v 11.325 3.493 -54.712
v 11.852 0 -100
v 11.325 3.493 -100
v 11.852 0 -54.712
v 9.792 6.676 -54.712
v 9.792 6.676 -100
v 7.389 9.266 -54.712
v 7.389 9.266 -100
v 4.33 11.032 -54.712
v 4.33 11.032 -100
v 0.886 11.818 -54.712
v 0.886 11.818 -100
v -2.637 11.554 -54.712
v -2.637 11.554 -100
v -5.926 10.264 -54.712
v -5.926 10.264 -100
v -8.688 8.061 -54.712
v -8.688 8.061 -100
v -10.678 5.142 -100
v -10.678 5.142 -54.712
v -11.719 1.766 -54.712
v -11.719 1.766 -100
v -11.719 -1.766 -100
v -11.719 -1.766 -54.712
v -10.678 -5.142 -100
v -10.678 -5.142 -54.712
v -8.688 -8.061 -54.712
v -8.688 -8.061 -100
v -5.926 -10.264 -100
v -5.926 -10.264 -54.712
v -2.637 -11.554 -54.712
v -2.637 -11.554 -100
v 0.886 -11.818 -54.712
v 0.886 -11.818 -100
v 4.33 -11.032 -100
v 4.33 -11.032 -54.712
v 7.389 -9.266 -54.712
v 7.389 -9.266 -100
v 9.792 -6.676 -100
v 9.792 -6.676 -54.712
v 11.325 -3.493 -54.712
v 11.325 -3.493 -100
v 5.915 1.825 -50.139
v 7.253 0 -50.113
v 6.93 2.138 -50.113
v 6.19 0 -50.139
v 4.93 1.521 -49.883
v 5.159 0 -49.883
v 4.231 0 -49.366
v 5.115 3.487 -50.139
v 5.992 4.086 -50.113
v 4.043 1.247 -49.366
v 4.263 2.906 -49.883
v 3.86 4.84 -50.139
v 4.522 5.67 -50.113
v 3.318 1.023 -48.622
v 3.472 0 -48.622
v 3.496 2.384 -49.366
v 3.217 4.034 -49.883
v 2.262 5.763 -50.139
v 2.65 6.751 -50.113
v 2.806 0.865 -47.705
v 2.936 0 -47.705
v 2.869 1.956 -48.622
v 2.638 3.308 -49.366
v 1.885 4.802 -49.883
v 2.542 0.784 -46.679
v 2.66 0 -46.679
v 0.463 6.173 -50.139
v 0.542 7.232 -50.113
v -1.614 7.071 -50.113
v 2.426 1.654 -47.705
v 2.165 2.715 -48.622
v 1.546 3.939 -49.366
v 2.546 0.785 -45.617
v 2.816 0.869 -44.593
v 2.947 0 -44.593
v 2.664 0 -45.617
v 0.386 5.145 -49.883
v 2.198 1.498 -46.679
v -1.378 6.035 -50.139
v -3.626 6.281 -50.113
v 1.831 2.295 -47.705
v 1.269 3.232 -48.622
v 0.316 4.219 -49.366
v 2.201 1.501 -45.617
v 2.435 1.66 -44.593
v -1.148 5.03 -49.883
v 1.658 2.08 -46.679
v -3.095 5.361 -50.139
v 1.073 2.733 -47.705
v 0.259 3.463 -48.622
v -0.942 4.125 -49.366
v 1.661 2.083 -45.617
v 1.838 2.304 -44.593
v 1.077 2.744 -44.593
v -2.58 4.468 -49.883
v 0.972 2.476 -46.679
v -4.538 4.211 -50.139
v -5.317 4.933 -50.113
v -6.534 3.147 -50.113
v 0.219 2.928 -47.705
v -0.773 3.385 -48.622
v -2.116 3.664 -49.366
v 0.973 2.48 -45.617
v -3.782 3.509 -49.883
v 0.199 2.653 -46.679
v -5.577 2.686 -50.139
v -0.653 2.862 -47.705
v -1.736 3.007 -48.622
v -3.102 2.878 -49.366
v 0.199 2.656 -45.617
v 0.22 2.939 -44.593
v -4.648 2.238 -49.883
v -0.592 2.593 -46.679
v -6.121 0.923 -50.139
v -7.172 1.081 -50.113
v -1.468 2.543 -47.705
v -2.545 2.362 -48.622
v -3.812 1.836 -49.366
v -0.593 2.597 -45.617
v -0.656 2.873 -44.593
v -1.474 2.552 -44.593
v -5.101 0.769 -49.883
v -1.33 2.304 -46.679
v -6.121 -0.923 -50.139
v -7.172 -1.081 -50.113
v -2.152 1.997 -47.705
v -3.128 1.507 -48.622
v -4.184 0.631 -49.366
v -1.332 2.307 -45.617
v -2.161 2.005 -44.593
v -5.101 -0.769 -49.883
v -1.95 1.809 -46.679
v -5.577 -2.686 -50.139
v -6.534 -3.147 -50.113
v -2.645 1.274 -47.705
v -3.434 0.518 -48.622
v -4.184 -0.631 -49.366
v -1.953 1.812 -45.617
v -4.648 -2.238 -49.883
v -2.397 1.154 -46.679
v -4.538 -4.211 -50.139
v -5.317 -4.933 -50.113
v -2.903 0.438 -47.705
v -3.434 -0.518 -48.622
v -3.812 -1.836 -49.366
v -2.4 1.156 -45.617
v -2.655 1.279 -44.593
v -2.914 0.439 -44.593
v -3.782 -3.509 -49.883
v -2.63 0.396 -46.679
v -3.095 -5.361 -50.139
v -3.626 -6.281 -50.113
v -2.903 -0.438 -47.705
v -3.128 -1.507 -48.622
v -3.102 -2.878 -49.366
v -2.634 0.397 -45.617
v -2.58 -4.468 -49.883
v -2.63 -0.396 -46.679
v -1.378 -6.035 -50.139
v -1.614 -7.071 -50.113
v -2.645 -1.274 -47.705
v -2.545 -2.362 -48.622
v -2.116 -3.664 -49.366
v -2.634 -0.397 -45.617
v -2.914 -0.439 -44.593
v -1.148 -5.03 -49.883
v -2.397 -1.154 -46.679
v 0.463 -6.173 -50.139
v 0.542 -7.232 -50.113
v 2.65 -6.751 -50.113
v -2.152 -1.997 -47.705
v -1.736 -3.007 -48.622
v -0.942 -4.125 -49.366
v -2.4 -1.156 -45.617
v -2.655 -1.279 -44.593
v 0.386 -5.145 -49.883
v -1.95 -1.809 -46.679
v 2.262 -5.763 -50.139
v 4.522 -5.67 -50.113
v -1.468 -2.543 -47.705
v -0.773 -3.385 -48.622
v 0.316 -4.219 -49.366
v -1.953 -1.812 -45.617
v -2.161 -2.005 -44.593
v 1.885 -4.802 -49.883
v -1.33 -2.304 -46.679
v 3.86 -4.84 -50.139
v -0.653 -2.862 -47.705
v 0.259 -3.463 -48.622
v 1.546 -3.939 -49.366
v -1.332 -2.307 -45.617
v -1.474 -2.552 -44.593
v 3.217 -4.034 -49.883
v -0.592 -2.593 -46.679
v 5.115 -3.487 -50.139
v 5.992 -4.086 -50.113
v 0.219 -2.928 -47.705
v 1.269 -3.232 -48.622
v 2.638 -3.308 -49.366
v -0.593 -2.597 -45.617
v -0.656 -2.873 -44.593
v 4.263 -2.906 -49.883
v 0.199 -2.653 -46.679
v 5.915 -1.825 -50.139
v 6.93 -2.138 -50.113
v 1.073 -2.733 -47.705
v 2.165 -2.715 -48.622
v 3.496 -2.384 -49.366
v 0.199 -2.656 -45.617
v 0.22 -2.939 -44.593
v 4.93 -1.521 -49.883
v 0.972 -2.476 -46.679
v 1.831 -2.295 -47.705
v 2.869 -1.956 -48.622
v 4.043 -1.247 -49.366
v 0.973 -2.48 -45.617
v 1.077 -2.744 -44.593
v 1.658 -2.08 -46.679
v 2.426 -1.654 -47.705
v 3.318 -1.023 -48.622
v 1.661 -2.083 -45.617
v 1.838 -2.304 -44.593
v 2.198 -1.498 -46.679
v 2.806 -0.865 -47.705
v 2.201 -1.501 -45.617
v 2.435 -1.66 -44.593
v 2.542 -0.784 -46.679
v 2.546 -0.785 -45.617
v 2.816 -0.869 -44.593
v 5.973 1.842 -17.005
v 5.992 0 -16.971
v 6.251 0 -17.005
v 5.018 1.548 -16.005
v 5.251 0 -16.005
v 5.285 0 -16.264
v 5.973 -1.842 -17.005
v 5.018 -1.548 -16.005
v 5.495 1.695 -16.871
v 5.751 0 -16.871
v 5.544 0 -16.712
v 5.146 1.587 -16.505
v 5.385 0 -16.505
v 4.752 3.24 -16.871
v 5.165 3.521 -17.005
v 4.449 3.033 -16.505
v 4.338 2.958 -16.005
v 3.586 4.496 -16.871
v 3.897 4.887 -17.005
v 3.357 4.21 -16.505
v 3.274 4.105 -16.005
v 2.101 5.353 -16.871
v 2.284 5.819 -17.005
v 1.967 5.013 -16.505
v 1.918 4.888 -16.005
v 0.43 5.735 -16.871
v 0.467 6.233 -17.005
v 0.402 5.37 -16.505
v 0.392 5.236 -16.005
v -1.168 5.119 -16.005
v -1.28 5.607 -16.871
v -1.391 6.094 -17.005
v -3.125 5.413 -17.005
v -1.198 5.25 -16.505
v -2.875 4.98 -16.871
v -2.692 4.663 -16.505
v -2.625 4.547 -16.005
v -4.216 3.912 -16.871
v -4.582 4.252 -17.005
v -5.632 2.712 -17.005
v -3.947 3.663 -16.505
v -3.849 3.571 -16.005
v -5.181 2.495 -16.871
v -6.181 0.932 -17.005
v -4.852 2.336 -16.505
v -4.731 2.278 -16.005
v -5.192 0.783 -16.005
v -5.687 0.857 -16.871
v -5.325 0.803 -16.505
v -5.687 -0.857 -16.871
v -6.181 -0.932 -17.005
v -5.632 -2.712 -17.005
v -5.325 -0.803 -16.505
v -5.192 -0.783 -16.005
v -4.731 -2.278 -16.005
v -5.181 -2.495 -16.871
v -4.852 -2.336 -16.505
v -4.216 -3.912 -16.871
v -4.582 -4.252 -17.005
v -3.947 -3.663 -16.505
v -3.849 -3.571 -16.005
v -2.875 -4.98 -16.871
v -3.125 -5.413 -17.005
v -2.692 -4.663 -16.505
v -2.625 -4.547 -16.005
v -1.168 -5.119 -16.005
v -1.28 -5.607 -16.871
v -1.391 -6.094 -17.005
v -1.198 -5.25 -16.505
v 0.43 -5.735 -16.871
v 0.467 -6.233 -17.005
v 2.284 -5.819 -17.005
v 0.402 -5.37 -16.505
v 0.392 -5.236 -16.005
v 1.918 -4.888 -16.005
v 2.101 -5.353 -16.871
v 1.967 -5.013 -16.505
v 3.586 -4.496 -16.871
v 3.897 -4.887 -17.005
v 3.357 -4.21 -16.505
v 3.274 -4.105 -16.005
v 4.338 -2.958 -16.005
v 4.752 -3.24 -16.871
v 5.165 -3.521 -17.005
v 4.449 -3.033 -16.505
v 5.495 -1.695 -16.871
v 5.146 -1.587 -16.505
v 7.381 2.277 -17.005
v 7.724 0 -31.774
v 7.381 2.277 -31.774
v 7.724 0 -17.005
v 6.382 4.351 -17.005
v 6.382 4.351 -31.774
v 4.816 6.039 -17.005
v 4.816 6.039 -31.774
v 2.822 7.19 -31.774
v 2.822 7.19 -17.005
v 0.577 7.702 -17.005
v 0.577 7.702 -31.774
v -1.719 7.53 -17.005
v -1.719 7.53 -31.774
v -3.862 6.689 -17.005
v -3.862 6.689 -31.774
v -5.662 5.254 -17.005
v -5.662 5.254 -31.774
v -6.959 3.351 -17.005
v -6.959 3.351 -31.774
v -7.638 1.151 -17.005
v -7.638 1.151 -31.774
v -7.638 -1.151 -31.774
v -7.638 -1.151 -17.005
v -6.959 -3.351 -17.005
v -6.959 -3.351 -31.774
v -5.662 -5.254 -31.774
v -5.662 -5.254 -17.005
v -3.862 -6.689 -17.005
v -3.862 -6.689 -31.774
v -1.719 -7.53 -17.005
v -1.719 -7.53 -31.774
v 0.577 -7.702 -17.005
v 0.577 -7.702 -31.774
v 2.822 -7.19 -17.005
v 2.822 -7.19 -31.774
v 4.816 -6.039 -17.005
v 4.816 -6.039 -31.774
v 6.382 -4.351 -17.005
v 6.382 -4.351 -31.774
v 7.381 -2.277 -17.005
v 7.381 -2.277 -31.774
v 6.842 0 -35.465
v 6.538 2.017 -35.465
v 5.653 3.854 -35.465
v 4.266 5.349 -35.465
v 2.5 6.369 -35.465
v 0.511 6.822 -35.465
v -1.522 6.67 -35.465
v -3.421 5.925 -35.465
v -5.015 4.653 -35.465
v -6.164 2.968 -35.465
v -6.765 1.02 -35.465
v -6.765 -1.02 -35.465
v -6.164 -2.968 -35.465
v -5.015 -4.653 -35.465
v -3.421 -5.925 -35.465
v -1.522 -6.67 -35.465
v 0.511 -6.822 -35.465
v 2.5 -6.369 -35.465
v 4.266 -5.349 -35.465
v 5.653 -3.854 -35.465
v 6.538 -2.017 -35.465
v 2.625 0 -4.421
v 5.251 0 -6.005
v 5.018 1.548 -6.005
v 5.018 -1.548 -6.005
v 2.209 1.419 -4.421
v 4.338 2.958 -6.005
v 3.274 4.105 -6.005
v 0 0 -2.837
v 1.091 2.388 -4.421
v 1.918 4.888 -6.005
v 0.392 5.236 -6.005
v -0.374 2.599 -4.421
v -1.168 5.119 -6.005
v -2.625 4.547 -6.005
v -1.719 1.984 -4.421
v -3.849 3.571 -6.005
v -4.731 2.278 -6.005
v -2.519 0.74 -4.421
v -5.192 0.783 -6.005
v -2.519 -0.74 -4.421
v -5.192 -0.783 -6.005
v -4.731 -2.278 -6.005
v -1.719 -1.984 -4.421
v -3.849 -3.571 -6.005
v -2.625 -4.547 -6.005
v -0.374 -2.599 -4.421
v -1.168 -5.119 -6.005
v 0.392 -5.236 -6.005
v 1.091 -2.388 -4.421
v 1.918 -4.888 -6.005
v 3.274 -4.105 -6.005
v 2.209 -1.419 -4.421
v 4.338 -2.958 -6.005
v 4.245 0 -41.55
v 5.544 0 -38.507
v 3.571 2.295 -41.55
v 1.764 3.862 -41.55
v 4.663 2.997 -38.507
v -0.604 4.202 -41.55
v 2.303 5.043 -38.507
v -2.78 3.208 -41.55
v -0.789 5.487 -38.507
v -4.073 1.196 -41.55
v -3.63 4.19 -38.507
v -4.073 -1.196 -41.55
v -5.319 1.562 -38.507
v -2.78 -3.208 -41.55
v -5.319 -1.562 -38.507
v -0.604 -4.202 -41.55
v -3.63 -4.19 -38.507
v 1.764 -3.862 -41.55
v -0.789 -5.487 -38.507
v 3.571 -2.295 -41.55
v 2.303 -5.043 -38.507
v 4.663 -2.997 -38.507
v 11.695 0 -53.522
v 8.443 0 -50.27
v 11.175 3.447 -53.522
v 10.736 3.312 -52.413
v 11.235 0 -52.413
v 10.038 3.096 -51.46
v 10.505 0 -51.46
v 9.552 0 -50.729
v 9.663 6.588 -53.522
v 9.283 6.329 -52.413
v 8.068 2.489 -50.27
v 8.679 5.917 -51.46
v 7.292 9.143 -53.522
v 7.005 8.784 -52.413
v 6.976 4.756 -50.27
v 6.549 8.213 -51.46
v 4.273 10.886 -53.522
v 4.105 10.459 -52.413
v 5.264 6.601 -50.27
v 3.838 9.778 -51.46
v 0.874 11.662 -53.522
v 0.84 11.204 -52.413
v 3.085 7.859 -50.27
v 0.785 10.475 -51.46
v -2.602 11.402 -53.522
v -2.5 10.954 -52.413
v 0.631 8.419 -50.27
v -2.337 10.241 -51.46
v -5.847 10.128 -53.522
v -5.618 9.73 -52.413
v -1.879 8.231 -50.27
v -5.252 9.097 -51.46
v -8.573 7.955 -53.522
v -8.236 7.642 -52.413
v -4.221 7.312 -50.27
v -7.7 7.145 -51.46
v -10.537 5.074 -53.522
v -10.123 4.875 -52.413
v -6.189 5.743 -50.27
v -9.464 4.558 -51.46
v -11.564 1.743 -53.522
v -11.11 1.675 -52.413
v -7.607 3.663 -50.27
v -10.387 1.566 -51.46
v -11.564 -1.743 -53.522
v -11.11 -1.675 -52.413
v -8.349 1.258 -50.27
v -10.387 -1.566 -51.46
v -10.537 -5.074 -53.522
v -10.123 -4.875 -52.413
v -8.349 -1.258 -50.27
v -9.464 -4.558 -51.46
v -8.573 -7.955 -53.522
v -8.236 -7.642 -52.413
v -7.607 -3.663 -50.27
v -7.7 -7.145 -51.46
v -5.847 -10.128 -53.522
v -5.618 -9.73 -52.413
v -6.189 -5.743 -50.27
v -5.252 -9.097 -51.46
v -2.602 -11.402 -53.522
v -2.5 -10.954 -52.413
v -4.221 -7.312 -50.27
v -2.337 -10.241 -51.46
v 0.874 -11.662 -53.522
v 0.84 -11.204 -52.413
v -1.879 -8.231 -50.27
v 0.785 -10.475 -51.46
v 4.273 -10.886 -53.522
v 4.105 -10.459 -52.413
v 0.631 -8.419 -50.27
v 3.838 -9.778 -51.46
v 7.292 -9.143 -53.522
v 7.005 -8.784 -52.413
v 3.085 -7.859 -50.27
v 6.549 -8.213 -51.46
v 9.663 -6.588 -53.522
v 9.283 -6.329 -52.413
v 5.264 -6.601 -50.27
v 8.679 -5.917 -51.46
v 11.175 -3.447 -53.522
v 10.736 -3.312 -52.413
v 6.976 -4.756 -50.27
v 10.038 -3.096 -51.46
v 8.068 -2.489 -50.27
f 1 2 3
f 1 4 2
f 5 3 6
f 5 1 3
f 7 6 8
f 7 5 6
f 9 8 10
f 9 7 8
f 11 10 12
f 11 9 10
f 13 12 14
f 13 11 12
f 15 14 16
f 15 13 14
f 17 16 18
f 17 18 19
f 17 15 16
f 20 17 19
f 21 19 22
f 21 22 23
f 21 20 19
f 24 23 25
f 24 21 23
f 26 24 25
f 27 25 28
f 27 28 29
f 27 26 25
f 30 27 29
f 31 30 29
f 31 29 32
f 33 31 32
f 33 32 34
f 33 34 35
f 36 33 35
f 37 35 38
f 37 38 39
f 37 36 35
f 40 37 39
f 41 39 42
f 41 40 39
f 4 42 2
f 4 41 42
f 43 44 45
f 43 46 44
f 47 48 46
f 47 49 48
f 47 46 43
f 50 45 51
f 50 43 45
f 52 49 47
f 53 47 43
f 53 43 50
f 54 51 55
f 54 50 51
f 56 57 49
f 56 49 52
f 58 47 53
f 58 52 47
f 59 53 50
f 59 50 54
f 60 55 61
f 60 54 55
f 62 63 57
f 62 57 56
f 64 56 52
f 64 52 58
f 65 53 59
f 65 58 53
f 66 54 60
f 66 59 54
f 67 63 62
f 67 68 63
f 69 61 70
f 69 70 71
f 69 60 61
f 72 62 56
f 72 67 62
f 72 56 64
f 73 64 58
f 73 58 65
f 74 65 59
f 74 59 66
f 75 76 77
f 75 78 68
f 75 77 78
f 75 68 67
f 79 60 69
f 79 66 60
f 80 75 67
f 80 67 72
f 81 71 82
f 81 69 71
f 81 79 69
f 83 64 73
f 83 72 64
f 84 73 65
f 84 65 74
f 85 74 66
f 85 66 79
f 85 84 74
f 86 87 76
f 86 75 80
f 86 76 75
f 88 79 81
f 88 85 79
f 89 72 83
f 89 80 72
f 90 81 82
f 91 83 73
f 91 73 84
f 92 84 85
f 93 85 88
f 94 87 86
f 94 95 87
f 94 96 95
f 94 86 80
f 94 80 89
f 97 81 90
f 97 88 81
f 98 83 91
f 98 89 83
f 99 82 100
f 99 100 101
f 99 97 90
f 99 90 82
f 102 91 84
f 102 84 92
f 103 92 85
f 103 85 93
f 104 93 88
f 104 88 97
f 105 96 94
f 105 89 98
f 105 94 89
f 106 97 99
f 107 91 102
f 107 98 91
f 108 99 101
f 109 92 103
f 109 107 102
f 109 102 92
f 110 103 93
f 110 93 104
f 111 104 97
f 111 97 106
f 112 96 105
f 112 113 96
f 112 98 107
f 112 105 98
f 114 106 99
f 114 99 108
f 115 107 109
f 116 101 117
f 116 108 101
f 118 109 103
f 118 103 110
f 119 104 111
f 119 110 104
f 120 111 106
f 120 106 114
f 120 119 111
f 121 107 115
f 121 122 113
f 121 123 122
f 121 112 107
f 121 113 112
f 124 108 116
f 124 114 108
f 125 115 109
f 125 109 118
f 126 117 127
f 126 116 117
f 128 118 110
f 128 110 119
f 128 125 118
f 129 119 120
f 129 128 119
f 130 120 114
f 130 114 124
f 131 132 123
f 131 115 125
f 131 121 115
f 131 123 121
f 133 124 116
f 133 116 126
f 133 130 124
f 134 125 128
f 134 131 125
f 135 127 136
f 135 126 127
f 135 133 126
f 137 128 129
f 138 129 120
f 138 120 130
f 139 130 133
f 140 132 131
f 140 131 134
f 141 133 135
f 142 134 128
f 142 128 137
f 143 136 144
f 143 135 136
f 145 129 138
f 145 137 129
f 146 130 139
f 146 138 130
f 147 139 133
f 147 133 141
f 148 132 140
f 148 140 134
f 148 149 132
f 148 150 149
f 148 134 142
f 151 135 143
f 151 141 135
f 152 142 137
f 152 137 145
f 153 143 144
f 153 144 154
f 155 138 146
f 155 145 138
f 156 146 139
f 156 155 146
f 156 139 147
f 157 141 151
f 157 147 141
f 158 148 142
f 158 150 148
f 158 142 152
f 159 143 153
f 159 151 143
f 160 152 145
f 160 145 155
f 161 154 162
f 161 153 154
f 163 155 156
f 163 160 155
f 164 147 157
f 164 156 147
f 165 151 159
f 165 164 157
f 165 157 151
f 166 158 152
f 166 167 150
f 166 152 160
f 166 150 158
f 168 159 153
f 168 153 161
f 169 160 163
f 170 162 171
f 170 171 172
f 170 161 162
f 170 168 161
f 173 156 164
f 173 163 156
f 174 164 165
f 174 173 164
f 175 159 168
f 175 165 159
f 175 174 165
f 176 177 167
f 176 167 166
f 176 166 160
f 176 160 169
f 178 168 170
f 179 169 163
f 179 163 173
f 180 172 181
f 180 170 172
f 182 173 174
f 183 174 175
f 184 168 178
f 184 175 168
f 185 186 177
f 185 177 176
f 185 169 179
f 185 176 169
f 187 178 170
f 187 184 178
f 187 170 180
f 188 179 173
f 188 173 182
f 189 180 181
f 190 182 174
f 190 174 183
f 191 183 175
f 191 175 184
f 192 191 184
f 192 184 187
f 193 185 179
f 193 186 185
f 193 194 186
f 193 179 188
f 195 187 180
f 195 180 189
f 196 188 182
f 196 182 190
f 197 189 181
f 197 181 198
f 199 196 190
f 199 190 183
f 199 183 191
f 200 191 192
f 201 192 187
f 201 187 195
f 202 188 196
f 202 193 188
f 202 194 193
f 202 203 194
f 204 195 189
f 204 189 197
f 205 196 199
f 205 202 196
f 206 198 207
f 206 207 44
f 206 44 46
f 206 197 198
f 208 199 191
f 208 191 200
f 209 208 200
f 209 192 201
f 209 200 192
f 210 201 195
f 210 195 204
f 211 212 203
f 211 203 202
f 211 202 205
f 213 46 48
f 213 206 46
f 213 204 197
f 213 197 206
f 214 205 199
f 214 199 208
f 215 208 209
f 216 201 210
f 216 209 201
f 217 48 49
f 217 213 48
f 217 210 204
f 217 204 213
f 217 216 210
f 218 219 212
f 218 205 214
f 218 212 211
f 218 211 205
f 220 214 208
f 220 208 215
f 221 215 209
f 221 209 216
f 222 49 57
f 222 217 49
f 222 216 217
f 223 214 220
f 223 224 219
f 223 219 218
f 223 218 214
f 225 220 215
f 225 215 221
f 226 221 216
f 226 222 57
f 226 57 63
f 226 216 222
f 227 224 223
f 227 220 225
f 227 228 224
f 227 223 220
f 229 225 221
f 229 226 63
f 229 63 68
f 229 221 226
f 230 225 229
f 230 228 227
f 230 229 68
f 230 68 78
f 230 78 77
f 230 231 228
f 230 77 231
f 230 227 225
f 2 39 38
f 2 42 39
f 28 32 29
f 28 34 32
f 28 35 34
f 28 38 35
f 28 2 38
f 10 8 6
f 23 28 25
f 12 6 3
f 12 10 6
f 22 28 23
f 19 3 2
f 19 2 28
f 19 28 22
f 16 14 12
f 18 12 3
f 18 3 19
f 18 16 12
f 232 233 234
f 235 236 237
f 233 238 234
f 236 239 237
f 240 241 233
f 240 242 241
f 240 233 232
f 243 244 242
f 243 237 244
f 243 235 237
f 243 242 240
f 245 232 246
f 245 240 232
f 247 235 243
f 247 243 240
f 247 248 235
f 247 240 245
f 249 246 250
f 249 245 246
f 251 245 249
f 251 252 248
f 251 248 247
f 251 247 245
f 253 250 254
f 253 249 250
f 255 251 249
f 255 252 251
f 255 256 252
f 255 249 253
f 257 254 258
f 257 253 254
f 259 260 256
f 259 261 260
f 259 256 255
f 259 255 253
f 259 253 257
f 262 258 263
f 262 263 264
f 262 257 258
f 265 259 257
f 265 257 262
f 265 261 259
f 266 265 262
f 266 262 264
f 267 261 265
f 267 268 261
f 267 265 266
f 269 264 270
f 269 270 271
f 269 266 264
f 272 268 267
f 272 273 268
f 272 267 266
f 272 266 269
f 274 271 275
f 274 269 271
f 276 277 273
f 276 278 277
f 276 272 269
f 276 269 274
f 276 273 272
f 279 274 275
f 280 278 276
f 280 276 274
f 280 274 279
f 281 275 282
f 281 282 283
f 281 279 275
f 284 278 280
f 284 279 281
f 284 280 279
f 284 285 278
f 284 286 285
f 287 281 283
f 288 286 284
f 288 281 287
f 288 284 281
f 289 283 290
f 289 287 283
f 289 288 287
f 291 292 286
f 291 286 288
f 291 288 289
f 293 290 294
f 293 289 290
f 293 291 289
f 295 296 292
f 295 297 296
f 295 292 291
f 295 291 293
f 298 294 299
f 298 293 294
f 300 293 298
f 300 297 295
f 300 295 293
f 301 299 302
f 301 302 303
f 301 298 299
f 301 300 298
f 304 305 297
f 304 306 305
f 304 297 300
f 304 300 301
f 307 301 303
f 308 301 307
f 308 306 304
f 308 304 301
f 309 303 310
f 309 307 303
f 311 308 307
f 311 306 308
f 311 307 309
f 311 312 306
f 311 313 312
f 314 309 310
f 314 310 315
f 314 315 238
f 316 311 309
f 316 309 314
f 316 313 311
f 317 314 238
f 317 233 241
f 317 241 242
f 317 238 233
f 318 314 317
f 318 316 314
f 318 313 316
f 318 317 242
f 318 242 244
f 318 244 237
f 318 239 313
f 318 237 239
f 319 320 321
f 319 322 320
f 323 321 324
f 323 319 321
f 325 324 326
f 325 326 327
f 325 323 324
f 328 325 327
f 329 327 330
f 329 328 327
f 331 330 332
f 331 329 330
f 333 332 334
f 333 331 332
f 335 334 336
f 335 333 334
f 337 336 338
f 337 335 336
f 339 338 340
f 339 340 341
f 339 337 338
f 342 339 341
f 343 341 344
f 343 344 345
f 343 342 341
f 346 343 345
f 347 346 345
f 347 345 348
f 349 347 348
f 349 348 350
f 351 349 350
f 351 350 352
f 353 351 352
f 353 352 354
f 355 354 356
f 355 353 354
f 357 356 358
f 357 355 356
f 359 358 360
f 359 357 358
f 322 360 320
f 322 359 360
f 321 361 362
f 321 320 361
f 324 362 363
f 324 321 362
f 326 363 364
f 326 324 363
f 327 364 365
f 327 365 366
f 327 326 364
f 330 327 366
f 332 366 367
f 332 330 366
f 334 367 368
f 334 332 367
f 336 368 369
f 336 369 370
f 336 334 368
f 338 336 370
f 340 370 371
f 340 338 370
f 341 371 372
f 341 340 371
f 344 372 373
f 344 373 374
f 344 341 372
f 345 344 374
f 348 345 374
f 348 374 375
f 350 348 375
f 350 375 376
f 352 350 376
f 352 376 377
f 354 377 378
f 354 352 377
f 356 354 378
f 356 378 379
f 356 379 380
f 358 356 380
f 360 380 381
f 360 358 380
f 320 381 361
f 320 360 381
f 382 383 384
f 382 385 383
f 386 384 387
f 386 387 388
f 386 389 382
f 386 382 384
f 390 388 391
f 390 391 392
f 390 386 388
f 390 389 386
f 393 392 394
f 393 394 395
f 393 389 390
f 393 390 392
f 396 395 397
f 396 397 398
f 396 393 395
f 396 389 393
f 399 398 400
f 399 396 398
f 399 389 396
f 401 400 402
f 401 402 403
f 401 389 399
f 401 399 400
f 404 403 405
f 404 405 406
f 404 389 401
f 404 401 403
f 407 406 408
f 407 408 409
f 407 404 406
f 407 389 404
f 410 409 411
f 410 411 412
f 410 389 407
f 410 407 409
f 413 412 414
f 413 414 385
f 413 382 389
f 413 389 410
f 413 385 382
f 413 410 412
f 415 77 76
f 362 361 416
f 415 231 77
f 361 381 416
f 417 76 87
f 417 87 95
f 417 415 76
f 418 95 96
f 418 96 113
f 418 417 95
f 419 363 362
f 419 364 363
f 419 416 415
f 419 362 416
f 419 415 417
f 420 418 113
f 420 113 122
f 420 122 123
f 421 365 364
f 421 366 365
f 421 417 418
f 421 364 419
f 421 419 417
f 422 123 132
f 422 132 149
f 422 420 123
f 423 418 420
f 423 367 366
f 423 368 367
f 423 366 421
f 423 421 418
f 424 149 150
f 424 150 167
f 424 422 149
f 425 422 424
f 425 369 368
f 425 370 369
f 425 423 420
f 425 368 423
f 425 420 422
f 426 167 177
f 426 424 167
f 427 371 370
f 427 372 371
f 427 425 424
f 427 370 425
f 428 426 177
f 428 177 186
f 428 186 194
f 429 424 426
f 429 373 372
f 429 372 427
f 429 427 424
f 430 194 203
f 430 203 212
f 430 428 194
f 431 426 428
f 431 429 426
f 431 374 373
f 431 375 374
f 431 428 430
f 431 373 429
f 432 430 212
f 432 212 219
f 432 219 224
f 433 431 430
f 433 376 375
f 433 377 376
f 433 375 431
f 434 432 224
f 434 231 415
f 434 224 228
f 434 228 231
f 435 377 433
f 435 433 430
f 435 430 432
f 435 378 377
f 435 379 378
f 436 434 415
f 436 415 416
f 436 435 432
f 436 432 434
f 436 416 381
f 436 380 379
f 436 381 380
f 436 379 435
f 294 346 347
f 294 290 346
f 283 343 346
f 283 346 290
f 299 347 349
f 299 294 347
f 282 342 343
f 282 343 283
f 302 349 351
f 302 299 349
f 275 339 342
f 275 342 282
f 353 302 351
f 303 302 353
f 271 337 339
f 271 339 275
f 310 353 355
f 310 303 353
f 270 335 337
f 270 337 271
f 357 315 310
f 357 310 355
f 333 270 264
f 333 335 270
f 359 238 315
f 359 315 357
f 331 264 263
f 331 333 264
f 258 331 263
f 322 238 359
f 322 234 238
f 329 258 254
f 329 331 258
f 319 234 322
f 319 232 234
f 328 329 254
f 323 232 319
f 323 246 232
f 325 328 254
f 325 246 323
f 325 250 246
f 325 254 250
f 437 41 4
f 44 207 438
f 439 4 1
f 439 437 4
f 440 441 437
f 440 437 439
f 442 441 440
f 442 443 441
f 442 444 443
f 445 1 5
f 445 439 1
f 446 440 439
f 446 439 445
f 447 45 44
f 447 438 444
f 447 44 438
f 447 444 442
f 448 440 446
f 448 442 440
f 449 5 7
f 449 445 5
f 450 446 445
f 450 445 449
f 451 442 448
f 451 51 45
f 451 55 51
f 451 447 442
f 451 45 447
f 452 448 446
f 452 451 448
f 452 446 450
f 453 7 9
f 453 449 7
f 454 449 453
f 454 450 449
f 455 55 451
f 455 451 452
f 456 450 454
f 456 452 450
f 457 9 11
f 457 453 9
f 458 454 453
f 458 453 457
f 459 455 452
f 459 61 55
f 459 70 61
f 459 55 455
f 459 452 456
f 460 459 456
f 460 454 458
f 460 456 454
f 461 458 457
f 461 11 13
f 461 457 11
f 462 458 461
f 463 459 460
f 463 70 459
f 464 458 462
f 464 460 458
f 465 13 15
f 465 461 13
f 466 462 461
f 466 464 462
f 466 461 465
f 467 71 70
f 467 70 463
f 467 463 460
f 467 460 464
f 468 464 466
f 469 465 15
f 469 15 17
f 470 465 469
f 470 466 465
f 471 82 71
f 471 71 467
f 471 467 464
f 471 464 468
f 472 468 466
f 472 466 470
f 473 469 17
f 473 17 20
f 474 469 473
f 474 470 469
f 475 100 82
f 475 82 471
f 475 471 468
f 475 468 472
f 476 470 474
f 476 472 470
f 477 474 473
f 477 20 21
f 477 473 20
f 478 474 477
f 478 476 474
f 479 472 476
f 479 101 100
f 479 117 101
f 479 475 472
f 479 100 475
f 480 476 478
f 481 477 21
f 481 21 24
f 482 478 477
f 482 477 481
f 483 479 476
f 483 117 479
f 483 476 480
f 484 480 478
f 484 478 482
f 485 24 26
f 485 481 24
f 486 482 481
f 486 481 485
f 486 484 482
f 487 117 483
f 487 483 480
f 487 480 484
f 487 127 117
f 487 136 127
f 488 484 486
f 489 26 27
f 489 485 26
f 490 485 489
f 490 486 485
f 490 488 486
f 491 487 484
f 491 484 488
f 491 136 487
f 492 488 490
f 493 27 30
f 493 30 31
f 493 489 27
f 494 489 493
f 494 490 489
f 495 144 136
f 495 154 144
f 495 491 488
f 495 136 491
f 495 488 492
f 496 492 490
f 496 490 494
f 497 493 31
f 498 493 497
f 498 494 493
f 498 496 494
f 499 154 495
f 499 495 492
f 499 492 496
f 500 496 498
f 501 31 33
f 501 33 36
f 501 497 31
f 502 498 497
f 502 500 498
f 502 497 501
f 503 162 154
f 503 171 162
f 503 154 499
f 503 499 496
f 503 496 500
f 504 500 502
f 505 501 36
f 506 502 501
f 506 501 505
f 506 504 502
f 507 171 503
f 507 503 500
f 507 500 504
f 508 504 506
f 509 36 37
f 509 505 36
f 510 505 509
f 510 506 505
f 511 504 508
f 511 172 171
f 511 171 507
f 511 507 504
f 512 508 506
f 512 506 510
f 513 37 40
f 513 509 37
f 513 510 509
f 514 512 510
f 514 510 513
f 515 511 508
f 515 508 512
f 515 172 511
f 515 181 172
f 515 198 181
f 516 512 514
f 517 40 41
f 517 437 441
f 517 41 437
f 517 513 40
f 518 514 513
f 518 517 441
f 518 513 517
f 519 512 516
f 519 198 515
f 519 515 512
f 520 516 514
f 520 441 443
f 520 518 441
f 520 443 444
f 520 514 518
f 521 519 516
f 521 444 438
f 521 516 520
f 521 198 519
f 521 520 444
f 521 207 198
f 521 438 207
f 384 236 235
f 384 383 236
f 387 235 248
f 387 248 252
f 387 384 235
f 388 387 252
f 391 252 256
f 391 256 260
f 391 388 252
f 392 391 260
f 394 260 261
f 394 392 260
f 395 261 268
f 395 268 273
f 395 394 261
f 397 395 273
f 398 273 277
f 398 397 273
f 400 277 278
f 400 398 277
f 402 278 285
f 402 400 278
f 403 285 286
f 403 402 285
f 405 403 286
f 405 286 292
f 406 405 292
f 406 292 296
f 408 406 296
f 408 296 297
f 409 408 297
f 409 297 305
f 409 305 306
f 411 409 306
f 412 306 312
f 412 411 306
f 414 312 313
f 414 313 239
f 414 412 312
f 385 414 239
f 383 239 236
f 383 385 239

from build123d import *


with BuildPart() as f1:
    # F0 (on Front) → F1 (revolve)
    with BuildSketch(Plane.XZ):
        with BuildLine():
            Line((5.250814, -16.005392), (5.250814, -6.005392))
            Line((5.250814, -6.005392), (0, -2.836546))
            Line((0, -2.836546), (0, -100))
            Line((0, -100), (11.851529, -100))
            Line((11.851529, -100), (11.851529, -54.711972))
            ThreePointArc((11.851529, -54.711972), (10.504539, -51.460051), (7.252618, -50.113061))
            ThreePointArc((7.252618, -50.113061), (3.472311, -48.622302), (2.947314, -44.592729))
            Line((2.947314, -44.592729), (6.841612, -35.464703))
            Line((6.841612, -35.464703), (7.723922, -31.773916))
            Line((7.723922, -31.773916), (7.723922, -17.005392))
            Line((7.723922, -17.005392), (6.250814, -17.005392))
            ThreePointArc((6.250814, -17.005392), (5.543708, -16.712499), (5.250814, -16.005392))
        make_face()
    revolve(axis=Axis((0, 0, -51.418273), (0, 0, 1)))


solid = f1.part
